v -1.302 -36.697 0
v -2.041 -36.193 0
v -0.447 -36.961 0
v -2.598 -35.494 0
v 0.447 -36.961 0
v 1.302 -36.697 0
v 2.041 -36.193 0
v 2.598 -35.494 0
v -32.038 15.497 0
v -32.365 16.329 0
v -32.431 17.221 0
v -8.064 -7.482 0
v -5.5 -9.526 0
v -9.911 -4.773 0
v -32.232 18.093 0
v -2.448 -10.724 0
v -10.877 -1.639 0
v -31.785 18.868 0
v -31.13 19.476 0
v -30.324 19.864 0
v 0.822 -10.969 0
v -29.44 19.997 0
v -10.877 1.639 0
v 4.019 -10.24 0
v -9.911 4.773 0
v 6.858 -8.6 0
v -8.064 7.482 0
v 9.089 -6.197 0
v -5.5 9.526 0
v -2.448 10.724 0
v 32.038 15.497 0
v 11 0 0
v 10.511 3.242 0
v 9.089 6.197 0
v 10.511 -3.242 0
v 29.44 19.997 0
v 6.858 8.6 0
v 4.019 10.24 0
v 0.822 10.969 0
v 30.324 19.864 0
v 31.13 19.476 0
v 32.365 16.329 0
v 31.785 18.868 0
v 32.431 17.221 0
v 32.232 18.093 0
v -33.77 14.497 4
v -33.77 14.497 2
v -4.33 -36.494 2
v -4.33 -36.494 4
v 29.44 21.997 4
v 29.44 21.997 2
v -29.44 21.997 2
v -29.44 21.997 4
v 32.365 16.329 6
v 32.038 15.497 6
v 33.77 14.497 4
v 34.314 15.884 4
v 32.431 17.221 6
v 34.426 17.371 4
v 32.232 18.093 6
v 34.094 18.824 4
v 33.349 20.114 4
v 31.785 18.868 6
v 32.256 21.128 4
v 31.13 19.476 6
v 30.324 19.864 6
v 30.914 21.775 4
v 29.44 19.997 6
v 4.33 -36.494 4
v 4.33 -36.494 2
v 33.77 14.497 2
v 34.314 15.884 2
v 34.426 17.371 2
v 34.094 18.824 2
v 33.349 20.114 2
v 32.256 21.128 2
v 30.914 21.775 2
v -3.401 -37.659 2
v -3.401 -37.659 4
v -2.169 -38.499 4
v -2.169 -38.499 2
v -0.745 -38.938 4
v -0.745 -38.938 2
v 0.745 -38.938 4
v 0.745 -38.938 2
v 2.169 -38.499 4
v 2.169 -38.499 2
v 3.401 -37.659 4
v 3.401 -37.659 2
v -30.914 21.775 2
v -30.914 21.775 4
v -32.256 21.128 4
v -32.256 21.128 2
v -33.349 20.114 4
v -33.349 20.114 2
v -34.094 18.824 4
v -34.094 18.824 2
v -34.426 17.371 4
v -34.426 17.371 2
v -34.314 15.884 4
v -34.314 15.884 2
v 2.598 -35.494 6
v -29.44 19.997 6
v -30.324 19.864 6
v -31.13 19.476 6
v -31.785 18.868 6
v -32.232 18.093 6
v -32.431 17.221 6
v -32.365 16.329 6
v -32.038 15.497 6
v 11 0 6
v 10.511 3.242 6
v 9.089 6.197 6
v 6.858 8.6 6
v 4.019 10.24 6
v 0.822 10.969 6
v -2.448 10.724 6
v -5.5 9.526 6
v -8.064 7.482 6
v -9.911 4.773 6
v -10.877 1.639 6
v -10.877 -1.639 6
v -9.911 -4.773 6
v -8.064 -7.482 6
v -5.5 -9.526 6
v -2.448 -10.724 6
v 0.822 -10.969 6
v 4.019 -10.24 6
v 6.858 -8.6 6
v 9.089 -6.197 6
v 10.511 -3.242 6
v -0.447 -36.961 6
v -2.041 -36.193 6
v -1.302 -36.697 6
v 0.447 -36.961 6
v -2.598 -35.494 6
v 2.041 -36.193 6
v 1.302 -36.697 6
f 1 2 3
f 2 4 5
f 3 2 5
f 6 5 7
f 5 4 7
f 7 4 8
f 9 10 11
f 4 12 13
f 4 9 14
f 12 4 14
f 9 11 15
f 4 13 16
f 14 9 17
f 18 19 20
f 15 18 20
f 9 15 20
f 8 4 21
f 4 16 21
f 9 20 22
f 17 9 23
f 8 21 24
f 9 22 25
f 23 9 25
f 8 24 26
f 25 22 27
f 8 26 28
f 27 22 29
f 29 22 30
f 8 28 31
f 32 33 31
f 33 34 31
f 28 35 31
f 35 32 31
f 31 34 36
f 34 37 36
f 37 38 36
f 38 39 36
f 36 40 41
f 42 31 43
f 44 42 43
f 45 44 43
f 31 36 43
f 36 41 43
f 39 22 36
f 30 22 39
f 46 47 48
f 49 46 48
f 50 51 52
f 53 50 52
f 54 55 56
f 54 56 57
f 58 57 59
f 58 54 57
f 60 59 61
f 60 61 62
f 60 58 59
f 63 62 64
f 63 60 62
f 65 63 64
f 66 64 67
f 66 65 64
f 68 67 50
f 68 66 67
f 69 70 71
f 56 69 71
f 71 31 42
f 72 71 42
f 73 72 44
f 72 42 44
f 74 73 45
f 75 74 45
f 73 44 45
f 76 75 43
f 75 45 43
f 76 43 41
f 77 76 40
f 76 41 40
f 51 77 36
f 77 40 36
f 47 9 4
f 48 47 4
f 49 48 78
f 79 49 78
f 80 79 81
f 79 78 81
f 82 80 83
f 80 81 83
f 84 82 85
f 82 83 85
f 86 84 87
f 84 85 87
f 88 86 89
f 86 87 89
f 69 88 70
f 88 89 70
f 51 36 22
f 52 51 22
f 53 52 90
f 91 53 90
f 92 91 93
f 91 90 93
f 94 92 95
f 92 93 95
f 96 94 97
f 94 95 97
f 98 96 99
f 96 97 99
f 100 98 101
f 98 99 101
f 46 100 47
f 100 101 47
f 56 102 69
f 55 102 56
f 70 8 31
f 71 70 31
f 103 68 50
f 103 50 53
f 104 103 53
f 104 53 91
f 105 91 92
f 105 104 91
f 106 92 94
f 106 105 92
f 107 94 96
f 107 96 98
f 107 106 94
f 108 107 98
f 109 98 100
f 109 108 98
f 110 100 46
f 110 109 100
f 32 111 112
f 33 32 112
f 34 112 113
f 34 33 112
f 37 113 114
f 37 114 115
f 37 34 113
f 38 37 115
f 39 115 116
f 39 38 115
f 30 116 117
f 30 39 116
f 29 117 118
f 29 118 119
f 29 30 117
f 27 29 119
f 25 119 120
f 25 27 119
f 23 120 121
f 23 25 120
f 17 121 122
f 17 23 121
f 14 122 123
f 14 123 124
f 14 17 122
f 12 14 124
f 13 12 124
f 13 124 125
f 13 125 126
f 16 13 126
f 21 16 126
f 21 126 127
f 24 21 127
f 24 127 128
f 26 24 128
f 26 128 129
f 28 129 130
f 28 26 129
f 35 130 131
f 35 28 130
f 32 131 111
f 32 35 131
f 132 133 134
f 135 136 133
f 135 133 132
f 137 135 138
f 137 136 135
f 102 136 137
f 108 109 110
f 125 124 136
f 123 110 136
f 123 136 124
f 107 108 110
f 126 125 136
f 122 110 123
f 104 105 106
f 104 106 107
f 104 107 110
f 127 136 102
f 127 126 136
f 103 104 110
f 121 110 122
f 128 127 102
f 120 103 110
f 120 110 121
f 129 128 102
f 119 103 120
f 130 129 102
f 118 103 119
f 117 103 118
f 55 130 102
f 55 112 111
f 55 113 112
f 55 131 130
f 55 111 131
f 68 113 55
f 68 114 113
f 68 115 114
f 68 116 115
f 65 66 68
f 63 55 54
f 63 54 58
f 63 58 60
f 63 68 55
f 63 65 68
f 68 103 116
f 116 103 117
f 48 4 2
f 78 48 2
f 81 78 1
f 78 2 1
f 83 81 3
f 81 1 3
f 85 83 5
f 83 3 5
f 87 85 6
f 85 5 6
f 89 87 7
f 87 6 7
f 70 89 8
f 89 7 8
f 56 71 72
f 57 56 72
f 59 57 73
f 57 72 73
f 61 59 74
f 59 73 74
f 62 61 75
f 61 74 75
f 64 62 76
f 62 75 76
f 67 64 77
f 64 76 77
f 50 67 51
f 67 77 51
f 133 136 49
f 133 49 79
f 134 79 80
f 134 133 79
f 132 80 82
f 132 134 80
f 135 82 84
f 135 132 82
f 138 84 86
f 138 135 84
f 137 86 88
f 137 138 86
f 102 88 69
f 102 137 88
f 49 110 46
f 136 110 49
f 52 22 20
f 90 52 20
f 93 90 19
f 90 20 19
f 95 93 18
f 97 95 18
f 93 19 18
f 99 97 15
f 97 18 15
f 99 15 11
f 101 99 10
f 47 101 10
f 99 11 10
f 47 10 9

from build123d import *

# Parameters (mm, degrees)
F0_R     = 11
F1_DEPTH = 6
F2_SIZE  = 2


# Not quite as in the source:
# - a feature of the source that left no trace in its solid (it failed there, or was rolled back) is left out


with BuildPart() as f1:
    # F0 (on Top) → F1 (new body)
    with BuildSketch(Plane.XY):
        with BuildLine():
            Line((29.4397459622, 21.9970452561), (-29.4397459622, 21.9970452561))
            ThreePointArc((-29.4397459622, 21.9970452561), (-33.7698729811, 19.4970452561), (-33.7698729811, 14.4970452561))
            Line((-33.7698729811, 14.4970452561), (-4.3301270189, -36.4940905122))
            ThreePointArc((-4.3301270189, -36.4940905122), (0, -38.9940905122), (4.3301270189, -36.4940905122))
            Line((4.3301270189, -36.4940905122), (33.7698729811, 14.4970452561))
            ThreePointArc((33.7698729811, 14.4970452561), (33.7698729811, 19.4970452561), (29.4397459622, 21.9970452561))
        make_face()
        Circle(F0_R, mode=Mode.SUBTRACT)
    extrude(amount=F1_DEPTH)

    # F2
    f2_edges = [f1.edges().sort_by_distance(p)[0] for p in [
        (-19.05, -10.998523, 6),
        (-19.05, -10.998523, 0),
        (0, 21.997045, 6),
        (33.769873, 19.497045, 0),
        (33.769873, 19.497045, 6),
        (0, 21.997045, 0),
        (-33.769873, 19.497045, 0),
        (-33.769873, 19.497045, 6),
        (0, -38.994091, 0),
        (0, -38.994091, 6),
        (19.05, -10.998523, 0),
        (19.05, -10.998523, 6),
    ]]
    chamfer(f2_edges, length=F2_SIZE)


solid = f1.part
